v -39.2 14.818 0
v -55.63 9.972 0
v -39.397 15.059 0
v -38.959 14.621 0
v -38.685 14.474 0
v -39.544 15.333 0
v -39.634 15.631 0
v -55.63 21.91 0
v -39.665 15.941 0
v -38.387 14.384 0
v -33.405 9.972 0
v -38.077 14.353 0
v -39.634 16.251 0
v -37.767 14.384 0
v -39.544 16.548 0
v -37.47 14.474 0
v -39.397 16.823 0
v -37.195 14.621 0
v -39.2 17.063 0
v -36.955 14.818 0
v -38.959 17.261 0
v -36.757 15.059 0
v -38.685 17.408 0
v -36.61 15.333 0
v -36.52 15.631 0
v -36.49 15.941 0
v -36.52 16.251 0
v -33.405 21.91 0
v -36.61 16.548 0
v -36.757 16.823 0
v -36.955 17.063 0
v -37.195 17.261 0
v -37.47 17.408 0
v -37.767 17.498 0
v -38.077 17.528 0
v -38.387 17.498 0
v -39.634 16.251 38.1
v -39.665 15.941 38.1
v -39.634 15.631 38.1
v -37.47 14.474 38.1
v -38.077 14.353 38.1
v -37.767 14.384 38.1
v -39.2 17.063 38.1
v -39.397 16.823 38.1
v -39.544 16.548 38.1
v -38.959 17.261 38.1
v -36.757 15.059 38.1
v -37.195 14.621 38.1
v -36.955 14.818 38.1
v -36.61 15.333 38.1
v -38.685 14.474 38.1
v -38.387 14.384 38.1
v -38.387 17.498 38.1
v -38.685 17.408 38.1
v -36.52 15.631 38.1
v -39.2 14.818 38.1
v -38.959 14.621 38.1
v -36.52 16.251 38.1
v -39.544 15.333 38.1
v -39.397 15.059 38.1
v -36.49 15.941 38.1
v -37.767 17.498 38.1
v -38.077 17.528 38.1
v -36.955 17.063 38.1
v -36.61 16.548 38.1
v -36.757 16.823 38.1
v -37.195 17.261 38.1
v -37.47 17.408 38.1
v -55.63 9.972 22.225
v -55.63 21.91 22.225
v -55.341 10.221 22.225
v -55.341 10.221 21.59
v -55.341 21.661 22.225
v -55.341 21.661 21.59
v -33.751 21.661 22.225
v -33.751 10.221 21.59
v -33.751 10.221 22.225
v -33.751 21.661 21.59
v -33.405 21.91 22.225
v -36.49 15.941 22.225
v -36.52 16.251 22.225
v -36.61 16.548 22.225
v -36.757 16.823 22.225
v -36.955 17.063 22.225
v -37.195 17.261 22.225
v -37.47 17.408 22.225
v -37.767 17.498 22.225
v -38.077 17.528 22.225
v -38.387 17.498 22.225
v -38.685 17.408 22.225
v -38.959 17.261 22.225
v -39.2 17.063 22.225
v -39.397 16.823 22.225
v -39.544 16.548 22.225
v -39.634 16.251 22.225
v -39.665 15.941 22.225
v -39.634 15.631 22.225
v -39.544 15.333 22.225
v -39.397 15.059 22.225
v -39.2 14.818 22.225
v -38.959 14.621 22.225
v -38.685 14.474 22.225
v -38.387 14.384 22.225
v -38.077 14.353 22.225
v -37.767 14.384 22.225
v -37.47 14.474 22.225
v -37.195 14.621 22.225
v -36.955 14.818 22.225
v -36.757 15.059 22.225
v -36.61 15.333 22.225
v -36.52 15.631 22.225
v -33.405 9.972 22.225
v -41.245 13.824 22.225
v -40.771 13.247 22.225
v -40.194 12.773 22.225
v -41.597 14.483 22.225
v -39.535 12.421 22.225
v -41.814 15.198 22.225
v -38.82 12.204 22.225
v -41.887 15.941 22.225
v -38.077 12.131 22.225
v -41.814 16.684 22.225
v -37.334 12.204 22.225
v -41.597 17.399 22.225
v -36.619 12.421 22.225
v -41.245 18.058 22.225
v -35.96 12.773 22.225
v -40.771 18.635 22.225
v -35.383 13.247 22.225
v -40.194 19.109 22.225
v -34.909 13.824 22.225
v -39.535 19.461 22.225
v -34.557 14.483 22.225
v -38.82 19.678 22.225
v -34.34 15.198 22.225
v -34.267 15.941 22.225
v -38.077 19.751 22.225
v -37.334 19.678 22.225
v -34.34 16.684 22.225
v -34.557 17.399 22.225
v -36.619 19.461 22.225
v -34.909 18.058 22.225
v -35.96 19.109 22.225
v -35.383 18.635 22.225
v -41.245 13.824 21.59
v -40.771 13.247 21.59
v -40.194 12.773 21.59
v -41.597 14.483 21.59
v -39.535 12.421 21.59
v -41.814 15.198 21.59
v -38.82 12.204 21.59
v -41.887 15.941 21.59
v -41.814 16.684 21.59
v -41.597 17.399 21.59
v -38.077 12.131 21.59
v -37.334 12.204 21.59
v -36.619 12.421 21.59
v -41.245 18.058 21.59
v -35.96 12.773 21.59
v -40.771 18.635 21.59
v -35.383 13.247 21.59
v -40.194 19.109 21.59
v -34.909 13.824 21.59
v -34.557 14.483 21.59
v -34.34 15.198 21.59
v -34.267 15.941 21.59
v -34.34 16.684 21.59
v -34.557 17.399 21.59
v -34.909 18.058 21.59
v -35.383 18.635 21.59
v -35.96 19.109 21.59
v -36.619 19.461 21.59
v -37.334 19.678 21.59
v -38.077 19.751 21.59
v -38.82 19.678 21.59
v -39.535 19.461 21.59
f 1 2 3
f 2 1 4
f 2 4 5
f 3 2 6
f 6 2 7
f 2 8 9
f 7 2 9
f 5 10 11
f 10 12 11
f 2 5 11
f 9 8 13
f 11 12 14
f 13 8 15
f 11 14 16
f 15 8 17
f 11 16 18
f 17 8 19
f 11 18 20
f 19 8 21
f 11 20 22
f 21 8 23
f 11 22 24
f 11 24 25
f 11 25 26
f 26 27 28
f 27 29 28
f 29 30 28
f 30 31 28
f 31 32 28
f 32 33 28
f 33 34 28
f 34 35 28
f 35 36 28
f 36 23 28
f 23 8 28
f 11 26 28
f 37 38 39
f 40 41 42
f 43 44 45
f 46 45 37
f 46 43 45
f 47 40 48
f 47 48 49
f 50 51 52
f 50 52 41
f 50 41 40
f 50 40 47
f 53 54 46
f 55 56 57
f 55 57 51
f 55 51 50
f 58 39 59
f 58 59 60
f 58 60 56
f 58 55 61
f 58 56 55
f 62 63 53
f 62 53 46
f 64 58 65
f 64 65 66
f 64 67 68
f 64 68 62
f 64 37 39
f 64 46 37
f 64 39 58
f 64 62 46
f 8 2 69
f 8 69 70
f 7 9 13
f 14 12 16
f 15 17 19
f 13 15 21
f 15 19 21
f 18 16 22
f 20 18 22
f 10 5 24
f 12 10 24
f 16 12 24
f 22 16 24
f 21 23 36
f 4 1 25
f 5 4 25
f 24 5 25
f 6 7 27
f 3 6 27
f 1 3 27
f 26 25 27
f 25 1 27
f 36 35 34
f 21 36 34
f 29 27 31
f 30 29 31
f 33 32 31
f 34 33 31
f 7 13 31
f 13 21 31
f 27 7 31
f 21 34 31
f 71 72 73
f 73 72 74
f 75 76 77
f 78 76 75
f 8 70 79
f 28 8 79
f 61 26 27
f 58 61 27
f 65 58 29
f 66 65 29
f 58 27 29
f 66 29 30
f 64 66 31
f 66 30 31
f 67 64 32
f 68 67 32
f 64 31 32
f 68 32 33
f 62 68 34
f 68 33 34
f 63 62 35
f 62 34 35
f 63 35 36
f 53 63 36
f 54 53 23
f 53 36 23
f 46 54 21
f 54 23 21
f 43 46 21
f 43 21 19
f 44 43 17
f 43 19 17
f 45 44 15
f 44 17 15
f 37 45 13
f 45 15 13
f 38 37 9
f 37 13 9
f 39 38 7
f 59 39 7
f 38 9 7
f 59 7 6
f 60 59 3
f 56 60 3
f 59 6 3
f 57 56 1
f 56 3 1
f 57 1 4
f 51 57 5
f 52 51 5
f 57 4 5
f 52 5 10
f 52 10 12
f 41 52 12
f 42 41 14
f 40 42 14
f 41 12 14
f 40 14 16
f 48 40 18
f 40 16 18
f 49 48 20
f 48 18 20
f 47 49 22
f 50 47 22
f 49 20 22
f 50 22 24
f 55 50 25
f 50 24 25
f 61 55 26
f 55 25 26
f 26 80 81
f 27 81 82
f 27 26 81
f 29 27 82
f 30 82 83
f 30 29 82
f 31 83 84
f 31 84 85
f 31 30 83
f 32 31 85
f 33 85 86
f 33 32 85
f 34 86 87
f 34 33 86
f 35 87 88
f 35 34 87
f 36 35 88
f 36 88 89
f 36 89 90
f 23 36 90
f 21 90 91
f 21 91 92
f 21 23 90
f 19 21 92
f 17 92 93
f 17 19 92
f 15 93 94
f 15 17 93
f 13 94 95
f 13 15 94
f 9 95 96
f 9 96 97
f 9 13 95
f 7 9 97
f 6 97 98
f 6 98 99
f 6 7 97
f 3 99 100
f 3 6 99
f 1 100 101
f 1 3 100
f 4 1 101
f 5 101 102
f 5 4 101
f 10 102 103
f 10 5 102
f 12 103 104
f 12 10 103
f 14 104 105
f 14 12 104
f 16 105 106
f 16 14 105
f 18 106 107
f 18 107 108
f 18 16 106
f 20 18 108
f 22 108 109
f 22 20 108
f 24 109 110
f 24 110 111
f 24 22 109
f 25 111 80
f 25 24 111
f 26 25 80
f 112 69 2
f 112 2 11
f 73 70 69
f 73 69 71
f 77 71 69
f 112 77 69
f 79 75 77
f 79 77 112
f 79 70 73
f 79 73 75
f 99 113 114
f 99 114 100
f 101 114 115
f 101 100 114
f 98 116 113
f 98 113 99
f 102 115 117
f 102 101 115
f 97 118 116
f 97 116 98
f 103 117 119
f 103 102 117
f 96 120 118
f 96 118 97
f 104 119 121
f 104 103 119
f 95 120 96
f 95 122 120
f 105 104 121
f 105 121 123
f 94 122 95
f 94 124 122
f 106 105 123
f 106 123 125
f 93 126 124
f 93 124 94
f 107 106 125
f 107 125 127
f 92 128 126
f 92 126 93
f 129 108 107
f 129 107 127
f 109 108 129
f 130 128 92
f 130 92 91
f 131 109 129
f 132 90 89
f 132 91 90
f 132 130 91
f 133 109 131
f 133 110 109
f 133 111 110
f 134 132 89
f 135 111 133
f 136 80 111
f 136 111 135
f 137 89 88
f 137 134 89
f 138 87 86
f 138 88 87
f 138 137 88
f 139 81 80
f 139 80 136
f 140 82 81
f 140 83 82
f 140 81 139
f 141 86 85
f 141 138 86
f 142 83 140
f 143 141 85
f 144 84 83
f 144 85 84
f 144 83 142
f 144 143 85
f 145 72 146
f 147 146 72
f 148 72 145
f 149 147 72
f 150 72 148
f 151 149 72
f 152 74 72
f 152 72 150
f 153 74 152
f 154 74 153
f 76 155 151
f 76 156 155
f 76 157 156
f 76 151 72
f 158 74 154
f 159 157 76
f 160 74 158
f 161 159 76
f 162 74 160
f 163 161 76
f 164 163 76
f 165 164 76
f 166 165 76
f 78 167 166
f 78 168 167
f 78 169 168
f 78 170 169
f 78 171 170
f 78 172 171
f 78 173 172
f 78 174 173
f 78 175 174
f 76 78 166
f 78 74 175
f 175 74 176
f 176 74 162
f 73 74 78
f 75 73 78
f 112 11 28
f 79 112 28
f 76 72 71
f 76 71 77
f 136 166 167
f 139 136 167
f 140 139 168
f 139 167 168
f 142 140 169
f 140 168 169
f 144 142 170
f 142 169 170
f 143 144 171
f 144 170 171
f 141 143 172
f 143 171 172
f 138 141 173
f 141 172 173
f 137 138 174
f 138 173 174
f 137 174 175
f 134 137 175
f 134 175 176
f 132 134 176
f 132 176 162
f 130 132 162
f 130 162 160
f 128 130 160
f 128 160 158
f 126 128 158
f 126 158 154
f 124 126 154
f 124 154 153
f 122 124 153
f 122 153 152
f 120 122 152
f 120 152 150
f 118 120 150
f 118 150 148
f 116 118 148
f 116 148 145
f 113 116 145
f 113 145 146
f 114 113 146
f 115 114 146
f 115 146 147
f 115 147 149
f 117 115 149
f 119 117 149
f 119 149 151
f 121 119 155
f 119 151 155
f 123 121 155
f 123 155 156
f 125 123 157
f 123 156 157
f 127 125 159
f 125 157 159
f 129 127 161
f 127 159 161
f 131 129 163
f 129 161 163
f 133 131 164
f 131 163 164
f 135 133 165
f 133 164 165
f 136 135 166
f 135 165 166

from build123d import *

# Parameters (mm, degrees)
F0_W     = 22.225
F0_H     = 11.938
F0_W_2   = 21.59
F0_H_2   = 11.4398148928
F1_DEPTH = 22.225
F0_R     = 3.81
F0_R_2   = 1.5875
F2_DEPTH = 22.225
F3_DEPTH = 38.1
F4_DEPTH = 21.59


with BuildPart() as f1:
    # F0 (on Top) → F1 (new body)
    with BuildSketch(Plane.XY):
        with Locations((-44.5170886815, 15.9408464691)):
            Rectangle(F0_W, F0_H)
        with Locations((-44.5462938675, 15.9408464691)):
            Rectangle(F0_W_2, F0_H_2, mode=Mode.SUBTRACT)
    extrude(amount=F1_DEPTH)



with BuildPart() as f2:
    # F0 (on Top) → F2 (new body)
    with BuildSketch(Plane.XY):
        with Locations((-38.077108562, 15.9408464691)):
            Circle(F0_R)
        with Locations((-38.077108562, 15.9408464691)):
            Circle(F0_R_2, mode=Mode.SUBTRACT)
    extrude(amount=F2_DEPTH)


with BuildPart() as f3:
    # F0 (on Top) → F3 (new body)
    with BuildSketch(Plane.XY):
        with Locations((-38.077108562, 15.9408464691)):
            Circle(F0_R_2)
    extrude(amount=F3_DEPTH)


with BuildPart() as f1_1:
    add(f1.part)

    add(f2.part)  # F4 merges F2
    # F0 (on Top) → F4 (join)
    with BuildSketch(Plane.XY):
        with Locations((-44.5170886815, 15.9408464691)):
            Rectangle(F0_W, F0_H)
        with Locations((-44.5462938675, 15.9408464691)):
            Rectangle(F0_W_2, F0_H_2, mode=Mode.SUBTRACT)
        with Locations((-44.5462938675, 15.9408464691)):
            Rectangle(F0_W_2, F0_H_2)
        with Locations((-38.077108562, 15.9408464691)):
            Circle(F0_R, mode=Mode.SUBTRACT)
    extrude(amount=F4_DEPTH)


solid = Compound([f3.part, f1_1.part])
